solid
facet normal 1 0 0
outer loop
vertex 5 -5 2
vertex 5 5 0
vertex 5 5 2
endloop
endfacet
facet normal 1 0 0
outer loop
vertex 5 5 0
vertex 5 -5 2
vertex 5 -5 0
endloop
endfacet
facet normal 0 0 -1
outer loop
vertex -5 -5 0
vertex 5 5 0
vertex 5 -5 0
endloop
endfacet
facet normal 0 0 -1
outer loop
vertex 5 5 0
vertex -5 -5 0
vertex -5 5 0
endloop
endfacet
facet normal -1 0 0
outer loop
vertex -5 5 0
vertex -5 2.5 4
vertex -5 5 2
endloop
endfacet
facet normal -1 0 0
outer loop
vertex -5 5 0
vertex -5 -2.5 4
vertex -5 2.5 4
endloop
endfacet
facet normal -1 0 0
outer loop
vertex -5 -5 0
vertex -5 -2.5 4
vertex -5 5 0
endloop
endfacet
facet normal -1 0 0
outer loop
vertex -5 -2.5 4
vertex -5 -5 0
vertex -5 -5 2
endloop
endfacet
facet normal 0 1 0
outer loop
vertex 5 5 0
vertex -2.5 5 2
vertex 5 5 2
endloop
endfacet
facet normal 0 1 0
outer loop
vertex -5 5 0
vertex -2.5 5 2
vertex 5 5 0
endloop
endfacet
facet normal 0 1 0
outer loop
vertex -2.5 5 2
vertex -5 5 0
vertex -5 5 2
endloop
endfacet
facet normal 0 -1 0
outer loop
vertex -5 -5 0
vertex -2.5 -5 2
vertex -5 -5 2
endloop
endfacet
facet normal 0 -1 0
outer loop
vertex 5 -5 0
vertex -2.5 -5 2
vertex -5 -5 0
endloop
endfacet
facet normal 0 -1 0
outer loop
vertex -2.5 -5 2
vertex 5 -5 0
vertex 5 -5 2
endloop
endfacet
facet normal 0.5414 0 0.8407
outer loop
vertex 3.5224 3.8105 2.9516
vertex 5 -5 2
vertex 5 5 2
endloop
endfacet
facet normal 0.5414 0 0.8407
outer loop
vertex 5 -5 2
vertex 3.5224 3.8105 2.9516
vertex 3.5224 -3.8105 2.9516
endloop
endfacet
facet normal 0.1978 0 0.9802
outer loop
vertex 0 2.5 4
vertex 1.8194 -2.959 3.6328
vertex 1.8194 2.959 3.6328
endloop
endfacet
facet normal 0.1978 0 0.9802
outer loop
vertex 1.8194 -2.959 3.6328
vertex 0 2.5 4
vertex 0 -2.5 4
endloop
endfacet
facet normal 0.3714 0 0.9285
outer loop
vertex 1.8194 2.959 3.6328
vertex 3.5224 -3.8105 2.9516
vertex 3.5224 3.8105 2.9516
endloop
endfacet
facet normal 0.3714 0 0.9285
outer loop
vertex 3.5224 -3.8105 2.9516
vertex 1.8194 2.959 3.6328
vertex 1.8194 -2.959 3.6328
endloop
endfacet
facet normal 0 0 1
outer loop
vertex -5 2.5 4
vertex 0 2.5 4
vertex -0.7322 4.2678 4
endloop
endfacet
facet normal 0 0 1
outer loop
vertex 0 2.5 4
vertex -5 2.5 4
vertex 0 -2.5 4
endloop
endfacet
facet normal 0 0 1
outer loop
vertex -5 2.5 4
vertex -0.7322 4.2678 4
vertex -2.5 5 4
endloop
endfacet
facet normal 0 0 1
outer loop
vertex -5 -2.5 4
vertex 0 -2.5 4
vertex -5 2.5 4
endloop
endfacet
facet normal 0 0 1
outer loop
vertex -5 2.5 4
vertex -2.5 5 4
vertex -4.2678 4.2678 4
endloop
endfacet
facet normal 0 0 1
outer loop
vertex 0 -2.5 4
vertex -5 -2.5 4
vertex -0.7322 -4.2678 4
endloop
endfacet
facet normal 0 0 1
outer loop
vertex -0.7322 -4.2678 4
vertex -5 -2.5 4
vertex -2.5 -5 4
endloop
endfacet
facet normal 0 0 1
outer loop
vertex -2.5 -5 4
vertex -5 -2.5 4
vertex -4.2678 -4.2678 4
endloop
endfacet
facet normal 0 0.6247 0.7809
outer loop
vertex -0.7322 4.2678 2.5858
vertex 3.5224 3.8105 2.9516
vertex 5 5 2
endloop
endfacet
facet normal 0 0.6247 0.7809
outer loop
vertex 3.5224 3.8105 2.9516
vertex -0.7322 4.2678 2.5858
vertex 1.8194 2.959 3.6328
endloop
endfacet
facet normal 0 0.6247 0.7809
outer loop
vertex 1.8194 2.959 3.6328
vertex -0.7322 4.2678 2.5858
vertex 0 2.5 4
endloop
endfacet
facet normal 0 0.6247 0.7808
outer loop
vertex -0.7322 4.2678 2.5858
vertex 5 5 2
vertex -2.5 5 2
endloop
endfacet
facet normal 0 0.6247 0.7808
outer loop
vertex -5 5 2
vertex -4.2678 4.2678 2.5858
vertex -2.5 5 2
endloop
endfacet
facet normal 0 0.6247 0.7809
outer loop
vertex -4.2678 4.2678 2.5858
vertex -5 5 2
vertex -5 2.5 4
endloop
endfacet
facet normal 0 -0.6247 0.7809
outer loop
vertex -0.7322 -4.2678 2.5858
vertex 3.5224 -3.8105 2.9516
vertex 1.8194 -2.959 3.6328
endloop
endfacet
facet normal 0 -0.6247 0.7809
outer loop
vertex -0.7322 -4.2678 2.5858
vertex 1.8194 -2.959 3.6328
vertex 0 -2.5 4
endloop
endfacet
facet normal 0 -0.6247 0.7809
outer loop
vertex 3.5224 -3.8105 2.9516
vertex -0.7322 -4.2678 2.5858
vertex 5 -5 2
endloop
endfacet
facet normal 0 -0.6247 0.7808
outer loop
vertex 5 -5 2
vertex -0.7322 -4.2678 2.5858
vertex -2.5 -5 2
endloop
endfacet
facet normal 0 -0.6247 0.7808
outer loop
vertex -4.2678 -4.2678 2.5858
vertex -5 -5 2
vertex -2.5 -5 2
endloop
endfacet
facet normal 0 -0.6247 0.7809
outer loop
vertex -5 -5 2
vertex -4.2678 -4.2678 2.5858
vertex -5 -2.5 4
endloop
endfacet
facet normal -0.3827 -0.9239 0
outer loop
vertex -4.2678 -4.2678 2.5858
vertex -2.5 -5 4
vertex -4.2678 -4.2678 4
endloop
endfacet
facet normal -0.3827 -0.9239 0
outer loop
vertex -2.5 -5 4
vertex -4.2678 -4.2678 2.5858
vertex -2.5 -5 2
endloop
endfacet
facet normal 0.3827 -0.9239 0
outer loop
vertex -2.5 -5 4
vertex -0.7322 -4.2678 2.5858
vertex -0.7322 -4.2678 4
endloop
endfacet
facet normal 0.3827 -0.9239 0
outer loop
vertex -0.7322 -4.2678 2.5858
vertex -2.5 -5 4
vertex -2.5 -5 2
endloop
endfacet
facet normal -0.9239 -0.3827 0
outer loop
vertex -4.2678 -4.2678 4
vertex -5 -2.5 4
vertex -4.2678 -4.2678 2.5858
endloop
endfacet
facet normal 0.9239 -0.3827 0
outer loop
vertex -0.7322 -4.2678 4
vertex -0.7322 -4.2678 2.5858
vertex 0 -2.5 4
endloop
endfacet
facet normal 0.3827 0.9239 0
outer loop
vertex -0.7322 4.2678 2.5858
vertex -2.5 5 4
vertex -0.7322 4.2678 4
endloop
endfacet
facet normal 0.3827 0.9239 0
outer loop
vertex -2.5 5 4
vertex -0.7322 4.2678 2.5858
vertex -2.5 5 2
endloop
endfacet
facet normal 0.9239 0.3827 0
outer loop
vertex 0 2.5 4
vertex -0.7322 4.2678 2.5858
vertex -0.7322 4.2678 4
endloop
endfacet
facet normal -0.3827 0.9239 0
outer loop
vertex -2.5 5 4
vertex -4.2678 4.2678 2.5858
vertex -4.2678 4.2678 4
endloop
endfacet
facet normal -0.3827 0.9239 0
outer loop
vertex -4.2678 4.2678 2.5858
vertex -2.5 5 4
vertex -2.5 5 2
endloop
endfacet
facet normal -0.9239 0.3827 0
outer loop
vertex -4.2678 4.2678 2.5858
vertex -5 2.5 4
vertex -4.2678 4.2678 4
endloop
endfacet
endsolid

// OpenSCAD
union() {

  pts = [[5,0],[0,0],[0,2]];
  hrp = sqrt(29);
  //angiso = acos(2/hrp);
  angarc = 180-acos(2/hrp)*2;
  r = (hrp/2)/(2/hrp);
  arc = [for (i=[1:2]) let (ta = 90-(angarc/3)*i) [cos(ta)*r,sin(ta)*r-(hrp)]];
  //
  difference() {
    union() {
      translate([-5,-5,0]) cube([10,10,2],center=false);
      translate([0,5,2]) rotate([90,0,0])
        linear_extrude(height=10) polygon(concat(pts,arc));
      translate([-5,-5,2]) cube([5,10,2],center=false);
    }
    
    translate([-7.5,5,0]) rotate([90,0,90])
      linear_extrude(height=15) polygon([[0,2],[1,5],[-2.5,4]]);
    translate([7.5,-5,0]) rotate([90,0,-90])
      linear_extrude(height=15) polygon([[0,2],[1,5],[-2.5,4]]);
  }

  translate([-2.5,-2.5,2])
    cylinder(h=2,d=5,center=false);

  translate([-2.5,2.5,2])
    cylinder(h=2,d=5,center=false);
}
